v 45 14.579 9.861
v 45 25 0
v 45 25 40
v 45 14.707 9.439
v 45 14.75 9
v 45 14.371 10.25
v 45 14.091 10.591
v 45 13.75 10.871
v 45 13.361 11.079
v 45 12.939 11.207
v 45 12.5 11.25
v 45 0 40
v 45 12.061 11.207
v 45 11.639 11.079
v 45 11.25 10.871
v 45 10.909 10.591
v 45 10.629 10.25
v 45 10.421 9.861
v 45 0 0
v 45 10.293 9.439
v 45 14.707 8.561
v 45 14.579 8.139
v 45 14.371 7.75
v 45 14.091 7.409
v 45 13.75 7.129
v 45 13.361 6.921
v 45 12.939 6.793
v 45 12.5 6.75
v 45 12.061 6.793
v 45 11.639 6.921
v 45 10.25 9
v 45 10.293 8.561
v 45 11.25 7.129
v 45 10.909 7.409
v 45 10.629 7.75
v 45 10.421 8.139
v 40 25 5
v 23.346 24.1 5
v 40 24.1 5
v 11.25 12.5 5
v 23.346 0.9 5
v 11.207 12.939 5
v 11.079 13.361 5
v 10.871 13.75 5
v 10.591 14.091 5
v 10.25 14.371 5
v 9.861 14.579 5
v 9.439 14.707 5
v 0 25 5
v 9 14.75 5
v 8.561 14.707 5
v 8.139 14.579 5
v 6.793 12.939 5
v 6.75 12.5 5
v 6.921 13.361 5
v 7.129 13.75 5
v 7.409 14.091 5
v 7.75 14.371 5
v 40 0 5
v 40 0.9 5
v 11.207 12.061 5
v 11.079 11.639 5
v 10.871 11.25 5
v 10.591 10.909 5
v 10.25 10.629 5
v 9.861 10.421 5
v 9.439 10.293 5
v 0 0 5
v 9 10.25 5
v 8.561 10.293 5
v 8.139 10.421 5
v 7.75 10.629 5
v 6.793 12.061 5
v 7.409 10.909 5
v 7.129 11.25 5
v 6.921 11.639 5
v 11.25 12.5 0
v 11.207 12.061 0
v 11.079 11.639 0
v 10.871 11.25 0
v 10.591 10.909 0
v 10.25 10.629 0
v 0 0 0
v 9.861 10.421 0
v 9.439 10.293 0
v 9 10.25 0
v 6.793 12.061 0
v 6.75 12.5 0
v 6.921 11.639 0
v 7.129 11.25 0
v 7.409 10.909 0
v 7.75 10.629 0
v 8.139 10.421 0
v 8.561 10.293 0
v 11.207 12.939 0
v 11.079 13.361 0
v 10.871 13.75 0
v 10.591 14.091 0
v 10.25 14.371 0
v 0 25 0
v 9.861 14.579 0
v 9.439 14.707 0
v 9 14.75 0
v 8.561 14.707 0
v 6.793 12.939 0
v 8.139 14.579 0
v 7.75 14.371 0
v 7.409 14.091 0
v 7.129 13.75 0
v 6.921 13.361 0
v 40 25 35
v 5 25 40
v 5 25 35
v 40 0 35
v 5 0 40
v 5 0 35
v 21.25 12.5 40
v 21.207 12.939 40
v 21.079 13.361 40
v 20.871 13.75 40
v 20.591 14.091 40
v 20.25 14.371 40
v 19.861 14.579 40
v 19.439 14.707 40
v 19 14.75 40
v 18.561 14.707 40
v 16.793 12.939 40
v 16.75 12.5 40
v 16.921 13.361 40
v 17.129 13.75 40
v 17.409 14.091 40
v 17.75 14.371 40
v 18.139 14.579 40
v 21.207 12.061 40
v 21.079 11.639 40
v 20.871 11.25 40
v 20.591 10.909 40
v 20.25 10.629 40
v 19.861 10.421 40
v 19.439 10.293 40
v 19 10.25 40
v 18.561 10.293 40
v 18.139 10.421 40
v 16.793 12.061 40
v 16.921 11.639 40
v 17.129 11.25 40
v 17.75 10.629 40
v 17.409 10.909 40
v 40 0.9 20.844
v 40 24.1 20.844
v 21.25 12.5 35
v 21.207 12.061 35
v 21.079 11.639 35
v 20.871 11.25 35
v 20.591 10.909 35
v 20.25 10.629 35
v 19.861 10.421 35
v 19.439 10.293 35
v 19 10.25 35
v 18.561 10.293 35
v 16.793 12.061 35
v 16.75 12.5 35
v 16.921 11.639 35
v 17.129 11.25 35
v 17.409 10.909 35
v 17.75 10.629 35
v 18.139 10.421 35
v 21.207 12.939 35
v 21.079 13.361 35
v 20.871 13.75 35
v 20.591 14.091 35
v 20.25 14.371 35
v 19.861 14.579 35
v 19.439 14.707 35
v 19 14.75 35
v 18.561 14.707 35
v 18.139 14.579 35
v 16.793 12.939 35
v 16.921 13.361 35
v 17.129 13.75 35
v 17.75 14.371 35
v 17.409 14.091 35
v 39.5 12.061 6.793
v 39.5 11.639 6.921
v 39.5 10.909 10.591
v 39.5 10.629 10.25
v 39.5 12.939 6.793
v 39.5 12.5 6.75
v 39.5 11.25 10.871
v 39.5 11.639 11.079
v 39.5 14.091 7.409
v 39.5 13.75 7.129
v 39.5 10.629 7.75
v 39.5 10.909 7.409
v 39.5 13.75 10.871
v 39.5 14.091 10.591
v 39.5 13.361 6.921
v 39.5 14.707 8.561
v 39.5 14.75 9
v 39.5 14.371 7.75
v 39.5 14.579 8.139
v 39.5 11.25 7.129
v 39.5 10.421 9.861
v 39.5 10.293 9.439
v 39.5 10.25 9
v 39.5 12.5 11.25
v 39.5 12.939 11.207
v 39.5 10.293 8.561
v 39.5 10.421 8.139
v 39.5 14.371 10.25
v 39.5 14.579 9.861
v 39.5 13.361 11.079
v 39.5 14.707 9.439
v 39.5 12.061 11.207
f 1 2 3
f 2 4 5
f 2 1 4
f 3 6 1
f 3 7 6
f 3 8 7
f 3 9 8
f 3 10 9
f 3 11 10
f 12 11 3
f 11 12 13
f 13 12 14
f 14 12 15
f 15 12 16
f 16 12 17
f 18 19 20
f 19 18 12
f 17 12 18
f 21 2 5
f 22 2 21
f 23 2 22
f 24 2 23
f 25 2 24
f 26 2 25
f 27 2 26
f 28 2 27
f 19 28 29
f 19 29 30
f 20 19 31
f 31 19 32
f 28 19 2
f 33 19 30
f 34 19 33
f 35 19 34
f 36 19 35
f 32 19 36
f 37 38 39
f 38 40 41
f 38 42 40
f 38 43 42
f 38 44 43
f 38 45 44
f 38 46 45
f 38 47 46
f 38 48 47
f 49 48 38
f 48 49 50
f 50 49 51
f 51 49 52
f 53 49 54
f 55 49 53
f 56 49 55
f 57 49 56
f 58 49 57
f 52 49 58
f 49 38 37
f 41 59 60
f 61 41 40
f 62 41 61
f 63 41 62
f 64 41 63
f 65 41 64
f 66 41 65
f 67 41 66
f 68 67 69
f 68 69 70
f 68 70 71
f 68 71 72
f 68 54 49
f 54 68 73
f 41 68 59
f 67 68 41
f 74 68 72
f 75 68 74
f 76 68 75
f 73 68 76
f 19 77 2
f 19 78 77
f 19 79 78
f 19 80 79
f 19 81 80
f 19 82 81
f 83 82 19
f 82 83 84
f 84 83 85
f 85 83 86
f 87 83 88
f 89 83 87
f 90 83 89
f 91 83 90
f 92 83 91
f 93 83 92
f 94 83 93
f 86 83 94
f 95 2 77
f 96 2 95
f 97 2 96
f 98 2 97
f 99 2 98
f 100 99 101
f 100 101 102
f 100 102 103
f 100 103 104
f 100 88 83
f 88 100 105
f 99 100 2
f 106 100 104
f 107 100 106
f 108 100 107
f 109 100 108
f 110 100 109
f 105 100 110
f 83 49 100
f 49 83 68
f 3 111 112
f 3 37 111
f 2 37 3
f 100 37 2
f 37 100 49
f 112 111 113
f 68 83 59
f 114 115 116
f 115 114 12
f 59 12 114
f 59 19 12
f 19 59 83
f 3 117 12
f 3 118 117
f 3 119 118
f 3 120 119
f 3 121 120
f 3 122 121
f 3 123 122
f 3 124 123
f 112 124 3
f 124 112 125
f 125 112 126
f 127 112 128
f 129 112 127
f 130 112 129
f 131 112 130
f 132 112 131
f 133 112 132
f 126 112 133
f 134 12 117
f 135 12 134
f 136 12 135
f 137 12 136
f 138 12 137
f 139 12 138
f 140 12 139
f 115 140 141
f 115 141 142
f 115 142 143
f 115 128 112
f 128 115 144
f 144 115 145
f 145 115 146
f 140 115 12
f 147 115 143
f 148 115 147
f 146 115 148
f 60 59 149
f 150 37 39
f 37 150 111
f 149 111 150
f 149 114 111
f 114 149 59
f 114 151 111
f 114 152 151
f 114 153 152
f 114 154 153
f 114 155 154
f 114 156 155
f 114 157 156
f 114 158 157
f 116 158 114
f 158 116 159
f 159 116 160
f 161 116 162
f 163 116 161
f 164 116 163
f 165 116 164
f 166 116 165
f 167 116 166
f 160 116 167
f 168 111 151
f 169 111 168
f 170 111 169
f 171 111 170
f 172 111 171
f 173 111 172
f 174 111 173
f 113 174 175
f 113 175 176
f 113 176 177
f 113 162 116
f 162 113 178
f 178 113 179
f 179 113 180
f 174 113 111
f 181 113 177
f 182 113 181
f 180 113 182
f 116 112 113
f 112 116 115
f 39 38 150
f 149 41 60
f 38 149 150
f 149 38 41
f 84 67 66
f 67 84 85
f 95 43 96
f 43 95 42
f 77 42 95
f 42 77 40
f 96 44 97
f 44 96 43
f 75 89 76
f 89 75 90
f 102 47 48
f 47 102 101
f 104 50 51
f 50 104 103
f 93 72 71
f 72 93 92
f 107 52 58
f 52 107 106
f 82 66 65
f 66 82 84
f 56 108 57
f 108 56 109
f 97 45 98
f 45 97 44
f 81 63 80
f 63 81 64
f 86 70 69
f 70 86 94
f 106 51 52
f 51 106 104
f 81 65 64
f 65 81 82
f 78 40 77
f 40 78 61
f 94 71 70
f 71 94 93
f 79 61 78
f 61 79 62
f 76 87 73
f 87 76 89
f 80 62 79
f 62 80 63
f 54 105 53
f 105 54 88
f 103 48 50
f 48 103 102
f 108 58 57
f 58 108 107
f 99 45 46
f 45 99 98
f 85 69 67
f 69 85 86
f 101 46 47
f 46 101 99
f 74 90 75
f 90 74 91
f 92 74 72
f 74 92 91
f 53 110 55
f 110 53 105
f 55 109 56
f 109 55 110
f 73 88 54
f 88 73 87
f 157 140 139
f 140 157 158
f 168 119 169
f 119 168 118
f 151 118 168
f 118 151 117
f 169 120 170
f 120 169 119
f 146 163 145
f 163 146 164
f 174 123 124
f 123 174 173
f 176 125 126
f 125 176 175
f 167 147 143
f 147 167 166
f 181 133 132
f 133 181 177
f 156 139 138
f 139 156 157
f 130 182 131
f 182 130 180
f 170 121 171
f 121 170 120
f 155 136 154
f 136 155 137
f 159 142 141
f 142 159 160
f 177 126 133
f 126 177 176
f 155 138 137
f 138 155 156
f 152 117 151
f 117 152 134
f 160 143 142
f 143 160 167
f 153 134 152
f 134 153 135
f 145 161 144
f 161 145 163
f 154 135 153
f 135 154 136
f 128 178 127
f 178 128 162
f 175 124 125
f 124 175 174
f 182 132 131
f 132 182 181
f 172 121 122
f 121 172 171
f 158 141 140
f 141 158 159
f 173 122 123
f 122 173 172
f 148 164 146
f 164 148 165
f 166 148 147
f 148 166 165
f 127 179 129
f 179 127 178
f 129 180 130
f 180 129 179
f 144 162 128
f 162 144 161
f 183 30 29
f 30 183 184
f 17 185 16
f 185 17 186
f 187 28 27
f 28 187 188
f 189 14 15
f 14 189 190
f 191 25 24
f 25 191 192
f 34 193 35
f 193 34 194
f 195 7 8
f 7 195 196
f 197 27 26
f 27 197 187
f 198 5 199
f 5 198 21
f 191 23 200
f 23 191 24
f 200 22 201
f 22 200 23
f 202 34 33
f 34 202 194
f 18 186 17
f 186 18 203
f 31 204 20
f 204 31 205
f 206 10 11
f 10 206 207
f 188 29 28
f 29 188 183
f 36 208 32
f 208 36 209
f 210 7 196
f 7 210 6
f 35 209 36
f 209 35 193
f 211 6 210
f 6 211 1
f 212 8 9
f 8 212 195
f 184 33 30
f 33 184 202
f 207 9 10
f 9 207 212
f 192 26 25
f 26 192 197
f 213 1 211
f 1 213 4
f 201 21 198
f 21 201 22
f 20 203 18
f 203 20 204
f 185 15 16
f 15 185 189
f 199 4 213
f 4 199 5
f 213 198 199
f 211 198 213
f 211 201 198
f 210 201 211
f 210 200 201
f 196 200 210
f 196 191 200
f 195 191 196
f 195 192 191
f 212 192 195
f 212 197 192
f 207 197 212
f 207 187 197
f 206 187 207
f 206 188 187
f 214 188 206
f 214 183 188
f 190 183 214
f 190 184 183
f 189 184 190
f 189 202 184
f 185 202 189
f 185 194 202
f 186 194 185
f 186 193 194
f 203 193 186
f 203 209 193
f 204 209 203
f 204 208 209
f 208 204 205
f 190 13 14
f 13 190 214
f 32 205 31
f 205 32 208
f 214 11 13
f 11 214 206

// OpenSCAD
$fn = 32;

// ----------------------------------------------------------------------
// Z-bracket: 45 x 25 x 40 mm
// ----------------------------------------------------------------------

// --- parameters (mm) ---
foot_len = 45;            // lower foot length, X
top_len = 35;             // upper foot length, X
depth = 25;               // bracket width, Y
step_h = 40;              // overall rise, Z
plate_t = 5;              // plate thickness
hole_d = 4.5;             // clearance for M4
rib_len = 17.6;           // gusset leg
rib_sink = 0.9;           // gusset overlap into the plates

module hole_z(px, py, z0) {
  translate([px, py, z0 - 0.5]) cylinder(h = plate_t + 1, d = hole_d);
}
module hole_x(py, pz) {
  translate([-0.5, py, pz]) rotate([0, 90, 0]) cylinder(h = plate_t + 1, d = hole_d);
}
module gusset(x0) {
  translate([x0, depth - rib_sink, 0])
    rotate([90, 0, 0])
      linear_extrude(height = depth - 2 * rib_sink)
        polygon(points = [[rib_sink, plate_t - rib_sink],
                          [rib_sink, plate_t - rib_sink + rib_len],
                          [-rib_len, plate_t - rib_sink]]);
}

difference() {
  union() {
    cube([foot_len, depth, plate_t]);
    /* web, overlapping the lower foot */
    translate([foot_len - plate_t, 0, 0]) cube([plate_t, depth, step_h]);
    /* upper foot, sunk into the web */
    translate([foot_len - plate_t - top_len, 0, step_h - plate_t]) cube([top_len + plate_t, depth, plate_t]);
    gusset(foot_len - plate_t);
  }
  hole_z(9, 12.5, 0);
  translate([foot_len - plate_t - 21, 0, 0]) hole_z(0, 12.5, step_h - plate_t);
  translate([foot_len - plate_t, 0, 0]) hole_x(12.5, 9);
}
